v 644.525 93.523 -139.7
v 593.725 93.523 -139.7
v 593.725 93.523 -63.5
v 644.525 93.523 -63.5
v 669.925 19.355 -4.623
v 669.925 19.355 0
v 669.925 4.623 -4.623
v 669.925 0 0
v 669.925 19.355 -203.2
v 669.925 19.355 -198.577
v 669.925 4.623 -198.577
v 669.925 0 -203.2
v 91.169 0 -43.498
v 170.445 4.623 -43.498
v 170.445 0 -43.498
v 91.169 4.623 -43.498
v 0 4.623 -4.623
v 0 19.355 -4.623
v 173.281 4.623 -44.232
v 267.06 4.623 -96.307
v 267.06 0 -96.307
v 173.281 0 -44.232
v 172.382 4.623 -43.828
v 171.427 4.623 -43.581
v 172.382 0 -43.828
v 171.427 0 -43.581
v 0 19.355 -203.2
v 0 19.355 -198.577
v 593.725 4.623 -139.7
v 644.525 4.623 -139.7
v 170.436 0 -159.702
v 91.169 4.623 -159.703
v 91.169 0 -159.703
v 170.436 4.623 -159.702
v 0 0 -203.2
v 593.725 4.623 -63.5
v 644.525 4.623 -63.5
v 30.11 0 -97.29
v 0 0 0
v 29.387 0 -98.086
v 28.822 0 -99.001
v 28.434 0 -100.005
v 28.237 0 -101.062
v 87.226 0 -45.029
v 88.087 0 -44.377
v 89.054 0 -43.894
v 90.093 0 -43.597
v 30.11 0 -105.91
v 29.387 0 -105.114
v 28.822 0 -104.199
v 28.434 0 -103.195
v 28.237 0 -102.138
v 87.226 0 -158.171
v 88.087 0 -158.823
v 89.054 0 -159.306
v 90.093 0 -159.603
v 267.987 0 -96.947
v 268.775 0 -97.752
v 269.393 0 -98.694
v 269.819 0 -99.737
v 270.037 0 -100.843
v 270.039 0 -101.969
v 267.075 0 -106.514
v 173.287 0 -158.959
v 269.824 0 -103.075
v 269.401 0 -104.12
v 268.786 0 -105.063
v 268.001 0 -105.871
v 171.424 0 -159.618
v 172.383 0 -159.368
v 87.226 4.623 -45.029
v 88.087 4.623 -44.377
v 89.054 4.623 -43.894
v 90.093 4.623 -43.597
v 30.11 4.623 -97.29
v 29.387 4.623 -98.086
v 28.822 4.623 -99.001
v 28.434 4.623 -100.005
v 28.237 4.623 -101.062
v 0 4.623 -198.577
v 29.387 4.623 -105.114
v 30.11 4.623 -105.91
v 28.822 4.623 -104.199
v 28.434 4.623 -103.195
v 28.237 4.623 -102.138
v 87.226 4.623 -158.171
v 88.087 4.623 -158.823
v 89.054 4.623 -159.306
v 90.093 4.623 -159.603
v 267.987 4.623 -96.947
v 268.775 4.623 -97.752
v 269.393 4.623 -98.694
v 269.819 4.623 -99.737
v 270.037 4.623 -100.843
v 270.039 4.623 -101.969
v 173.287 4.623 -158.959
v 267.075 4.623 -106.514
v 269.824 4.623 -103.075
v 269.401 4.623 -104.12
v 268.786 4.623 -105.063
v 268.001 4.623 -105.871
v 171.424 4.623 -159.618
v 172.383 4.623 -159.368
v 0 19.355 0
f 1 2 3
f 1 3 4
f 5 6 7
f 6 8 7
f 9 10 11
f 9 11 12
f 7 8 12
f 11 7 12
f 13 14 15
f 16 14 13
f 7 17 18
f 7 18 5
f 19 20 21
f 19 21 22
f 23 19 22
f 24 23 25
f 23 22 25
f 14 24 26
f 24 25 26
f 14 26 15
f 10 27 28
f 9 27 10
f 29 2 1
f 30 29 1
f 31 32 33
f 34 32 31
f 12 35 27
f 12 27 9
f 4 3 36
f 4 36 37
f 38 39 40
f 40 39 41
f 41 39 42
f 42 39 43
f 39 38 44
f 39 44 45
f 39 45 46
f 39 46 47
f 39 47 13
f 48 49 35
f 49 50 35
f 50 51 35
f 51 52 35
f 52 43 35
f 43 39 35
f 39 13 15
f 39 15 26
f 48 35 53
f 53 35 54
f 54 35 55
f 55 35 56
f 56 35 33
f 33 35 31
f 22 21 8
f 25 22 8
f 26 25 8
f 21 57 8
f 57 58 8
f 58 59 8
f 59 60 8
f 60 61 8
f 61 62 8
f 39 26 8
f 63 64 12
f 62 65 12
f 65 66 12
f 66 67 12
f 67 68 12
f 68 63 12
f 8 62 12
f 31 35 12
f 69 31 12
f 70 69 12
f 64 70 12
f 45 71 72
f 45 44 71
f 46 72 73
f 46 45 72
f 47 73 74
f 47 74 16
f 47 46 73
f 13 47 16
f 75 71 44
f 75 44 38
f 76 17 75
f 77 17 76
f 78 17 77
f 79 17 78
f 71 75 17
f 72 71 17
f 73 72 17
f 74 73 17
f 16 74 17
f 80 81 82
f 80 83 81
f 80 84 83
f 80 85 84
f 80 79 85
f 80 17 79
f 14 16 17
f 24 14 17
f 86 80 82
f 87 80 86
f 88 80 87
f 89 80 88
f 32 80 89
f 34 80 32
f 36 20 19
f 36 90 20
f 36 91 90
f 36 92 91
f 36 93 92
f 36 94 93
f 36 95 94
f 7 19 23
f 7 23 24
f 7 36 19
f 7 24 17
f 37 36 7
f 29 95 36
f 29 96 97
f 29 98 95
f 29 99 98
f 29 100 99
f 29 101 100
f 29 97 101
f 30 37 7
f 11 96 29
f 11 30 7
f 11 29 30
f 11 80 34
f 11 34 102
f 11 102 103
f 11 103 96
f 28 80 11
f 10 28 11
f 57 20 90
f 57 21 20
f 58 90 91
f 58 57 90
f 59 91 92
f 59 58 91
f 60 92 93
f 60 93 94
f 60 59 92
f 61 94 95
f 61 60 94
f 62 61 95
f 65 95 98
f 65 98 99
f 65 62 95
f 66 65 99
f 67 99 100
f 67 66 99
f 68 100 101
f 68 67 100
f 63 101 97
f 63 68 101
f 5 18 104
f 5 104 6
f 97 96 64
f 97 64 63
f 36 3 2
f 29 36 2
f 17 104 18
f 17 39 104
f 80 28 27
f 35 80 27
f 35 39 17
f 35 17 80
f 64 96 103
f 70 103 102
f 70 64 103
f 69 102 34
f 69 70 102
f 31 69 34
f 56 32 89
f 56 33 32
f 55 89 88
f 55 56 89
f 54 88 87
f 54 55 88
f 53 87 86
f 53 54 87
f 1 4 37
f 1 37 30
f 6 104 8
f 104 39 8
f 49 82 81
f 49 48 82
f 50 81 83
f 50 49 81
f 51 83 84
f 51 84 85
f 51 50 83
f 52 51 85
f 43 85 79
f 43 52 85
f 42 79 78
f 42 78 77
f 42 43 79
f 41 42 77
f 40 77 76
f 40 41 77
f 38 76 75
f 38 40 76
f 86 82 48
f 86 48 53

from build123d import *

# Parameters (mm, degrees)
SKETCH1_W           = 669.925
SKETCH1_H           = 203.2
BOSS_EXTRUDE1_DEPTH = 4.6228
SKETCH2_W           = 669.925
SKETCH2_H           = 4.6228
BOSS_EXTRUDE2_DEPTH = 14.732
CUT_EXTRUDE1_DEPTH  = 5.6228
FILLET1_R           = 5.842
SKETCH4_W           = 50.8
SKETCH4_H           = 76.2
BOSS_EXTRUDE3_DEPTH = 88.9


with BuildPart() as part:
    # Sketch1 → Boss-Extrude1 (new body)
    with BuildSketch(Plane(origin=(0, 0, 0), x_dir=(1, 0, 0), z_dir=(0, 1, 0))):
        with Locations((334.9625, 101.6)):
            Rectangle(SKETCH1_W, SKETCH1_H)
    extrude(amount=BOSS_EXTRUDE1_DEPTH)

    # Sketch2 → Boss-Extrude2 (add)
    with BuildSketch(Plane(origin=(0, 4.6228, 0), x_dir=(1, 0, 0), z_dir=(0, 1, 0))):
        with Locations((334.9625, 2.3114)):
            Rectangle(SKETCH2_W, SKETCH2_H)
        with Locations((334.9625, 200.8886)):
            Rectangle(SKETCH2_W, SKETCH2_H)
    extrude(amount=BOSS_EXTRUDE2_DEPTH)

    # Sketch3 → Cut-Extrude1 (cut, through all)
    with BuildSketch(Plane(origin=(0, 4.6228, 0), x_dir=(1, 0, 0), z_dir=(0, 1, 0))):
        Polygon((171.958, 43.4975), (88.9, 43.4975), (25.4, 101.6), (88.9, 159.7025), (171.958, 159.7025), (276.225, 101.3968), align=None)
    extrude(amount=-CUT_EXTRUDE1_DEPTH, mode=Mode.SUBTRACT)

    # Fillet1
    fillet1_edges = [part.edges().sort_by_distance(p)[0] for p in [
        (171.958, 2.3114, -159.7025),
        (276.225, 2.3114, -101.3968),
        (171.958, 2.3114, -43.4975),
        (88.9, 2.3114, -43.4975),
        (25.4, 2.3114, -101.6),
        (88.9, 2.3114, -159.7025),
    ]]
    fillet(fillet1_edges, radius=FILLET1_R)

    # Sketch4 → Boss-Extrude3 (add)
    with BuildSketch(Plane(origin=(0, 4.6228, 0), x_dir=(1, 0, 0), z_dir=(0, 1, 0))):
        with Locations((619.125, 101.6)):
            Rectangle(SKETCH4_W, SKETCH4_H)
    extrude(amount=BOSS_EXTRUDE3_DEPTH)


solid = part.part
